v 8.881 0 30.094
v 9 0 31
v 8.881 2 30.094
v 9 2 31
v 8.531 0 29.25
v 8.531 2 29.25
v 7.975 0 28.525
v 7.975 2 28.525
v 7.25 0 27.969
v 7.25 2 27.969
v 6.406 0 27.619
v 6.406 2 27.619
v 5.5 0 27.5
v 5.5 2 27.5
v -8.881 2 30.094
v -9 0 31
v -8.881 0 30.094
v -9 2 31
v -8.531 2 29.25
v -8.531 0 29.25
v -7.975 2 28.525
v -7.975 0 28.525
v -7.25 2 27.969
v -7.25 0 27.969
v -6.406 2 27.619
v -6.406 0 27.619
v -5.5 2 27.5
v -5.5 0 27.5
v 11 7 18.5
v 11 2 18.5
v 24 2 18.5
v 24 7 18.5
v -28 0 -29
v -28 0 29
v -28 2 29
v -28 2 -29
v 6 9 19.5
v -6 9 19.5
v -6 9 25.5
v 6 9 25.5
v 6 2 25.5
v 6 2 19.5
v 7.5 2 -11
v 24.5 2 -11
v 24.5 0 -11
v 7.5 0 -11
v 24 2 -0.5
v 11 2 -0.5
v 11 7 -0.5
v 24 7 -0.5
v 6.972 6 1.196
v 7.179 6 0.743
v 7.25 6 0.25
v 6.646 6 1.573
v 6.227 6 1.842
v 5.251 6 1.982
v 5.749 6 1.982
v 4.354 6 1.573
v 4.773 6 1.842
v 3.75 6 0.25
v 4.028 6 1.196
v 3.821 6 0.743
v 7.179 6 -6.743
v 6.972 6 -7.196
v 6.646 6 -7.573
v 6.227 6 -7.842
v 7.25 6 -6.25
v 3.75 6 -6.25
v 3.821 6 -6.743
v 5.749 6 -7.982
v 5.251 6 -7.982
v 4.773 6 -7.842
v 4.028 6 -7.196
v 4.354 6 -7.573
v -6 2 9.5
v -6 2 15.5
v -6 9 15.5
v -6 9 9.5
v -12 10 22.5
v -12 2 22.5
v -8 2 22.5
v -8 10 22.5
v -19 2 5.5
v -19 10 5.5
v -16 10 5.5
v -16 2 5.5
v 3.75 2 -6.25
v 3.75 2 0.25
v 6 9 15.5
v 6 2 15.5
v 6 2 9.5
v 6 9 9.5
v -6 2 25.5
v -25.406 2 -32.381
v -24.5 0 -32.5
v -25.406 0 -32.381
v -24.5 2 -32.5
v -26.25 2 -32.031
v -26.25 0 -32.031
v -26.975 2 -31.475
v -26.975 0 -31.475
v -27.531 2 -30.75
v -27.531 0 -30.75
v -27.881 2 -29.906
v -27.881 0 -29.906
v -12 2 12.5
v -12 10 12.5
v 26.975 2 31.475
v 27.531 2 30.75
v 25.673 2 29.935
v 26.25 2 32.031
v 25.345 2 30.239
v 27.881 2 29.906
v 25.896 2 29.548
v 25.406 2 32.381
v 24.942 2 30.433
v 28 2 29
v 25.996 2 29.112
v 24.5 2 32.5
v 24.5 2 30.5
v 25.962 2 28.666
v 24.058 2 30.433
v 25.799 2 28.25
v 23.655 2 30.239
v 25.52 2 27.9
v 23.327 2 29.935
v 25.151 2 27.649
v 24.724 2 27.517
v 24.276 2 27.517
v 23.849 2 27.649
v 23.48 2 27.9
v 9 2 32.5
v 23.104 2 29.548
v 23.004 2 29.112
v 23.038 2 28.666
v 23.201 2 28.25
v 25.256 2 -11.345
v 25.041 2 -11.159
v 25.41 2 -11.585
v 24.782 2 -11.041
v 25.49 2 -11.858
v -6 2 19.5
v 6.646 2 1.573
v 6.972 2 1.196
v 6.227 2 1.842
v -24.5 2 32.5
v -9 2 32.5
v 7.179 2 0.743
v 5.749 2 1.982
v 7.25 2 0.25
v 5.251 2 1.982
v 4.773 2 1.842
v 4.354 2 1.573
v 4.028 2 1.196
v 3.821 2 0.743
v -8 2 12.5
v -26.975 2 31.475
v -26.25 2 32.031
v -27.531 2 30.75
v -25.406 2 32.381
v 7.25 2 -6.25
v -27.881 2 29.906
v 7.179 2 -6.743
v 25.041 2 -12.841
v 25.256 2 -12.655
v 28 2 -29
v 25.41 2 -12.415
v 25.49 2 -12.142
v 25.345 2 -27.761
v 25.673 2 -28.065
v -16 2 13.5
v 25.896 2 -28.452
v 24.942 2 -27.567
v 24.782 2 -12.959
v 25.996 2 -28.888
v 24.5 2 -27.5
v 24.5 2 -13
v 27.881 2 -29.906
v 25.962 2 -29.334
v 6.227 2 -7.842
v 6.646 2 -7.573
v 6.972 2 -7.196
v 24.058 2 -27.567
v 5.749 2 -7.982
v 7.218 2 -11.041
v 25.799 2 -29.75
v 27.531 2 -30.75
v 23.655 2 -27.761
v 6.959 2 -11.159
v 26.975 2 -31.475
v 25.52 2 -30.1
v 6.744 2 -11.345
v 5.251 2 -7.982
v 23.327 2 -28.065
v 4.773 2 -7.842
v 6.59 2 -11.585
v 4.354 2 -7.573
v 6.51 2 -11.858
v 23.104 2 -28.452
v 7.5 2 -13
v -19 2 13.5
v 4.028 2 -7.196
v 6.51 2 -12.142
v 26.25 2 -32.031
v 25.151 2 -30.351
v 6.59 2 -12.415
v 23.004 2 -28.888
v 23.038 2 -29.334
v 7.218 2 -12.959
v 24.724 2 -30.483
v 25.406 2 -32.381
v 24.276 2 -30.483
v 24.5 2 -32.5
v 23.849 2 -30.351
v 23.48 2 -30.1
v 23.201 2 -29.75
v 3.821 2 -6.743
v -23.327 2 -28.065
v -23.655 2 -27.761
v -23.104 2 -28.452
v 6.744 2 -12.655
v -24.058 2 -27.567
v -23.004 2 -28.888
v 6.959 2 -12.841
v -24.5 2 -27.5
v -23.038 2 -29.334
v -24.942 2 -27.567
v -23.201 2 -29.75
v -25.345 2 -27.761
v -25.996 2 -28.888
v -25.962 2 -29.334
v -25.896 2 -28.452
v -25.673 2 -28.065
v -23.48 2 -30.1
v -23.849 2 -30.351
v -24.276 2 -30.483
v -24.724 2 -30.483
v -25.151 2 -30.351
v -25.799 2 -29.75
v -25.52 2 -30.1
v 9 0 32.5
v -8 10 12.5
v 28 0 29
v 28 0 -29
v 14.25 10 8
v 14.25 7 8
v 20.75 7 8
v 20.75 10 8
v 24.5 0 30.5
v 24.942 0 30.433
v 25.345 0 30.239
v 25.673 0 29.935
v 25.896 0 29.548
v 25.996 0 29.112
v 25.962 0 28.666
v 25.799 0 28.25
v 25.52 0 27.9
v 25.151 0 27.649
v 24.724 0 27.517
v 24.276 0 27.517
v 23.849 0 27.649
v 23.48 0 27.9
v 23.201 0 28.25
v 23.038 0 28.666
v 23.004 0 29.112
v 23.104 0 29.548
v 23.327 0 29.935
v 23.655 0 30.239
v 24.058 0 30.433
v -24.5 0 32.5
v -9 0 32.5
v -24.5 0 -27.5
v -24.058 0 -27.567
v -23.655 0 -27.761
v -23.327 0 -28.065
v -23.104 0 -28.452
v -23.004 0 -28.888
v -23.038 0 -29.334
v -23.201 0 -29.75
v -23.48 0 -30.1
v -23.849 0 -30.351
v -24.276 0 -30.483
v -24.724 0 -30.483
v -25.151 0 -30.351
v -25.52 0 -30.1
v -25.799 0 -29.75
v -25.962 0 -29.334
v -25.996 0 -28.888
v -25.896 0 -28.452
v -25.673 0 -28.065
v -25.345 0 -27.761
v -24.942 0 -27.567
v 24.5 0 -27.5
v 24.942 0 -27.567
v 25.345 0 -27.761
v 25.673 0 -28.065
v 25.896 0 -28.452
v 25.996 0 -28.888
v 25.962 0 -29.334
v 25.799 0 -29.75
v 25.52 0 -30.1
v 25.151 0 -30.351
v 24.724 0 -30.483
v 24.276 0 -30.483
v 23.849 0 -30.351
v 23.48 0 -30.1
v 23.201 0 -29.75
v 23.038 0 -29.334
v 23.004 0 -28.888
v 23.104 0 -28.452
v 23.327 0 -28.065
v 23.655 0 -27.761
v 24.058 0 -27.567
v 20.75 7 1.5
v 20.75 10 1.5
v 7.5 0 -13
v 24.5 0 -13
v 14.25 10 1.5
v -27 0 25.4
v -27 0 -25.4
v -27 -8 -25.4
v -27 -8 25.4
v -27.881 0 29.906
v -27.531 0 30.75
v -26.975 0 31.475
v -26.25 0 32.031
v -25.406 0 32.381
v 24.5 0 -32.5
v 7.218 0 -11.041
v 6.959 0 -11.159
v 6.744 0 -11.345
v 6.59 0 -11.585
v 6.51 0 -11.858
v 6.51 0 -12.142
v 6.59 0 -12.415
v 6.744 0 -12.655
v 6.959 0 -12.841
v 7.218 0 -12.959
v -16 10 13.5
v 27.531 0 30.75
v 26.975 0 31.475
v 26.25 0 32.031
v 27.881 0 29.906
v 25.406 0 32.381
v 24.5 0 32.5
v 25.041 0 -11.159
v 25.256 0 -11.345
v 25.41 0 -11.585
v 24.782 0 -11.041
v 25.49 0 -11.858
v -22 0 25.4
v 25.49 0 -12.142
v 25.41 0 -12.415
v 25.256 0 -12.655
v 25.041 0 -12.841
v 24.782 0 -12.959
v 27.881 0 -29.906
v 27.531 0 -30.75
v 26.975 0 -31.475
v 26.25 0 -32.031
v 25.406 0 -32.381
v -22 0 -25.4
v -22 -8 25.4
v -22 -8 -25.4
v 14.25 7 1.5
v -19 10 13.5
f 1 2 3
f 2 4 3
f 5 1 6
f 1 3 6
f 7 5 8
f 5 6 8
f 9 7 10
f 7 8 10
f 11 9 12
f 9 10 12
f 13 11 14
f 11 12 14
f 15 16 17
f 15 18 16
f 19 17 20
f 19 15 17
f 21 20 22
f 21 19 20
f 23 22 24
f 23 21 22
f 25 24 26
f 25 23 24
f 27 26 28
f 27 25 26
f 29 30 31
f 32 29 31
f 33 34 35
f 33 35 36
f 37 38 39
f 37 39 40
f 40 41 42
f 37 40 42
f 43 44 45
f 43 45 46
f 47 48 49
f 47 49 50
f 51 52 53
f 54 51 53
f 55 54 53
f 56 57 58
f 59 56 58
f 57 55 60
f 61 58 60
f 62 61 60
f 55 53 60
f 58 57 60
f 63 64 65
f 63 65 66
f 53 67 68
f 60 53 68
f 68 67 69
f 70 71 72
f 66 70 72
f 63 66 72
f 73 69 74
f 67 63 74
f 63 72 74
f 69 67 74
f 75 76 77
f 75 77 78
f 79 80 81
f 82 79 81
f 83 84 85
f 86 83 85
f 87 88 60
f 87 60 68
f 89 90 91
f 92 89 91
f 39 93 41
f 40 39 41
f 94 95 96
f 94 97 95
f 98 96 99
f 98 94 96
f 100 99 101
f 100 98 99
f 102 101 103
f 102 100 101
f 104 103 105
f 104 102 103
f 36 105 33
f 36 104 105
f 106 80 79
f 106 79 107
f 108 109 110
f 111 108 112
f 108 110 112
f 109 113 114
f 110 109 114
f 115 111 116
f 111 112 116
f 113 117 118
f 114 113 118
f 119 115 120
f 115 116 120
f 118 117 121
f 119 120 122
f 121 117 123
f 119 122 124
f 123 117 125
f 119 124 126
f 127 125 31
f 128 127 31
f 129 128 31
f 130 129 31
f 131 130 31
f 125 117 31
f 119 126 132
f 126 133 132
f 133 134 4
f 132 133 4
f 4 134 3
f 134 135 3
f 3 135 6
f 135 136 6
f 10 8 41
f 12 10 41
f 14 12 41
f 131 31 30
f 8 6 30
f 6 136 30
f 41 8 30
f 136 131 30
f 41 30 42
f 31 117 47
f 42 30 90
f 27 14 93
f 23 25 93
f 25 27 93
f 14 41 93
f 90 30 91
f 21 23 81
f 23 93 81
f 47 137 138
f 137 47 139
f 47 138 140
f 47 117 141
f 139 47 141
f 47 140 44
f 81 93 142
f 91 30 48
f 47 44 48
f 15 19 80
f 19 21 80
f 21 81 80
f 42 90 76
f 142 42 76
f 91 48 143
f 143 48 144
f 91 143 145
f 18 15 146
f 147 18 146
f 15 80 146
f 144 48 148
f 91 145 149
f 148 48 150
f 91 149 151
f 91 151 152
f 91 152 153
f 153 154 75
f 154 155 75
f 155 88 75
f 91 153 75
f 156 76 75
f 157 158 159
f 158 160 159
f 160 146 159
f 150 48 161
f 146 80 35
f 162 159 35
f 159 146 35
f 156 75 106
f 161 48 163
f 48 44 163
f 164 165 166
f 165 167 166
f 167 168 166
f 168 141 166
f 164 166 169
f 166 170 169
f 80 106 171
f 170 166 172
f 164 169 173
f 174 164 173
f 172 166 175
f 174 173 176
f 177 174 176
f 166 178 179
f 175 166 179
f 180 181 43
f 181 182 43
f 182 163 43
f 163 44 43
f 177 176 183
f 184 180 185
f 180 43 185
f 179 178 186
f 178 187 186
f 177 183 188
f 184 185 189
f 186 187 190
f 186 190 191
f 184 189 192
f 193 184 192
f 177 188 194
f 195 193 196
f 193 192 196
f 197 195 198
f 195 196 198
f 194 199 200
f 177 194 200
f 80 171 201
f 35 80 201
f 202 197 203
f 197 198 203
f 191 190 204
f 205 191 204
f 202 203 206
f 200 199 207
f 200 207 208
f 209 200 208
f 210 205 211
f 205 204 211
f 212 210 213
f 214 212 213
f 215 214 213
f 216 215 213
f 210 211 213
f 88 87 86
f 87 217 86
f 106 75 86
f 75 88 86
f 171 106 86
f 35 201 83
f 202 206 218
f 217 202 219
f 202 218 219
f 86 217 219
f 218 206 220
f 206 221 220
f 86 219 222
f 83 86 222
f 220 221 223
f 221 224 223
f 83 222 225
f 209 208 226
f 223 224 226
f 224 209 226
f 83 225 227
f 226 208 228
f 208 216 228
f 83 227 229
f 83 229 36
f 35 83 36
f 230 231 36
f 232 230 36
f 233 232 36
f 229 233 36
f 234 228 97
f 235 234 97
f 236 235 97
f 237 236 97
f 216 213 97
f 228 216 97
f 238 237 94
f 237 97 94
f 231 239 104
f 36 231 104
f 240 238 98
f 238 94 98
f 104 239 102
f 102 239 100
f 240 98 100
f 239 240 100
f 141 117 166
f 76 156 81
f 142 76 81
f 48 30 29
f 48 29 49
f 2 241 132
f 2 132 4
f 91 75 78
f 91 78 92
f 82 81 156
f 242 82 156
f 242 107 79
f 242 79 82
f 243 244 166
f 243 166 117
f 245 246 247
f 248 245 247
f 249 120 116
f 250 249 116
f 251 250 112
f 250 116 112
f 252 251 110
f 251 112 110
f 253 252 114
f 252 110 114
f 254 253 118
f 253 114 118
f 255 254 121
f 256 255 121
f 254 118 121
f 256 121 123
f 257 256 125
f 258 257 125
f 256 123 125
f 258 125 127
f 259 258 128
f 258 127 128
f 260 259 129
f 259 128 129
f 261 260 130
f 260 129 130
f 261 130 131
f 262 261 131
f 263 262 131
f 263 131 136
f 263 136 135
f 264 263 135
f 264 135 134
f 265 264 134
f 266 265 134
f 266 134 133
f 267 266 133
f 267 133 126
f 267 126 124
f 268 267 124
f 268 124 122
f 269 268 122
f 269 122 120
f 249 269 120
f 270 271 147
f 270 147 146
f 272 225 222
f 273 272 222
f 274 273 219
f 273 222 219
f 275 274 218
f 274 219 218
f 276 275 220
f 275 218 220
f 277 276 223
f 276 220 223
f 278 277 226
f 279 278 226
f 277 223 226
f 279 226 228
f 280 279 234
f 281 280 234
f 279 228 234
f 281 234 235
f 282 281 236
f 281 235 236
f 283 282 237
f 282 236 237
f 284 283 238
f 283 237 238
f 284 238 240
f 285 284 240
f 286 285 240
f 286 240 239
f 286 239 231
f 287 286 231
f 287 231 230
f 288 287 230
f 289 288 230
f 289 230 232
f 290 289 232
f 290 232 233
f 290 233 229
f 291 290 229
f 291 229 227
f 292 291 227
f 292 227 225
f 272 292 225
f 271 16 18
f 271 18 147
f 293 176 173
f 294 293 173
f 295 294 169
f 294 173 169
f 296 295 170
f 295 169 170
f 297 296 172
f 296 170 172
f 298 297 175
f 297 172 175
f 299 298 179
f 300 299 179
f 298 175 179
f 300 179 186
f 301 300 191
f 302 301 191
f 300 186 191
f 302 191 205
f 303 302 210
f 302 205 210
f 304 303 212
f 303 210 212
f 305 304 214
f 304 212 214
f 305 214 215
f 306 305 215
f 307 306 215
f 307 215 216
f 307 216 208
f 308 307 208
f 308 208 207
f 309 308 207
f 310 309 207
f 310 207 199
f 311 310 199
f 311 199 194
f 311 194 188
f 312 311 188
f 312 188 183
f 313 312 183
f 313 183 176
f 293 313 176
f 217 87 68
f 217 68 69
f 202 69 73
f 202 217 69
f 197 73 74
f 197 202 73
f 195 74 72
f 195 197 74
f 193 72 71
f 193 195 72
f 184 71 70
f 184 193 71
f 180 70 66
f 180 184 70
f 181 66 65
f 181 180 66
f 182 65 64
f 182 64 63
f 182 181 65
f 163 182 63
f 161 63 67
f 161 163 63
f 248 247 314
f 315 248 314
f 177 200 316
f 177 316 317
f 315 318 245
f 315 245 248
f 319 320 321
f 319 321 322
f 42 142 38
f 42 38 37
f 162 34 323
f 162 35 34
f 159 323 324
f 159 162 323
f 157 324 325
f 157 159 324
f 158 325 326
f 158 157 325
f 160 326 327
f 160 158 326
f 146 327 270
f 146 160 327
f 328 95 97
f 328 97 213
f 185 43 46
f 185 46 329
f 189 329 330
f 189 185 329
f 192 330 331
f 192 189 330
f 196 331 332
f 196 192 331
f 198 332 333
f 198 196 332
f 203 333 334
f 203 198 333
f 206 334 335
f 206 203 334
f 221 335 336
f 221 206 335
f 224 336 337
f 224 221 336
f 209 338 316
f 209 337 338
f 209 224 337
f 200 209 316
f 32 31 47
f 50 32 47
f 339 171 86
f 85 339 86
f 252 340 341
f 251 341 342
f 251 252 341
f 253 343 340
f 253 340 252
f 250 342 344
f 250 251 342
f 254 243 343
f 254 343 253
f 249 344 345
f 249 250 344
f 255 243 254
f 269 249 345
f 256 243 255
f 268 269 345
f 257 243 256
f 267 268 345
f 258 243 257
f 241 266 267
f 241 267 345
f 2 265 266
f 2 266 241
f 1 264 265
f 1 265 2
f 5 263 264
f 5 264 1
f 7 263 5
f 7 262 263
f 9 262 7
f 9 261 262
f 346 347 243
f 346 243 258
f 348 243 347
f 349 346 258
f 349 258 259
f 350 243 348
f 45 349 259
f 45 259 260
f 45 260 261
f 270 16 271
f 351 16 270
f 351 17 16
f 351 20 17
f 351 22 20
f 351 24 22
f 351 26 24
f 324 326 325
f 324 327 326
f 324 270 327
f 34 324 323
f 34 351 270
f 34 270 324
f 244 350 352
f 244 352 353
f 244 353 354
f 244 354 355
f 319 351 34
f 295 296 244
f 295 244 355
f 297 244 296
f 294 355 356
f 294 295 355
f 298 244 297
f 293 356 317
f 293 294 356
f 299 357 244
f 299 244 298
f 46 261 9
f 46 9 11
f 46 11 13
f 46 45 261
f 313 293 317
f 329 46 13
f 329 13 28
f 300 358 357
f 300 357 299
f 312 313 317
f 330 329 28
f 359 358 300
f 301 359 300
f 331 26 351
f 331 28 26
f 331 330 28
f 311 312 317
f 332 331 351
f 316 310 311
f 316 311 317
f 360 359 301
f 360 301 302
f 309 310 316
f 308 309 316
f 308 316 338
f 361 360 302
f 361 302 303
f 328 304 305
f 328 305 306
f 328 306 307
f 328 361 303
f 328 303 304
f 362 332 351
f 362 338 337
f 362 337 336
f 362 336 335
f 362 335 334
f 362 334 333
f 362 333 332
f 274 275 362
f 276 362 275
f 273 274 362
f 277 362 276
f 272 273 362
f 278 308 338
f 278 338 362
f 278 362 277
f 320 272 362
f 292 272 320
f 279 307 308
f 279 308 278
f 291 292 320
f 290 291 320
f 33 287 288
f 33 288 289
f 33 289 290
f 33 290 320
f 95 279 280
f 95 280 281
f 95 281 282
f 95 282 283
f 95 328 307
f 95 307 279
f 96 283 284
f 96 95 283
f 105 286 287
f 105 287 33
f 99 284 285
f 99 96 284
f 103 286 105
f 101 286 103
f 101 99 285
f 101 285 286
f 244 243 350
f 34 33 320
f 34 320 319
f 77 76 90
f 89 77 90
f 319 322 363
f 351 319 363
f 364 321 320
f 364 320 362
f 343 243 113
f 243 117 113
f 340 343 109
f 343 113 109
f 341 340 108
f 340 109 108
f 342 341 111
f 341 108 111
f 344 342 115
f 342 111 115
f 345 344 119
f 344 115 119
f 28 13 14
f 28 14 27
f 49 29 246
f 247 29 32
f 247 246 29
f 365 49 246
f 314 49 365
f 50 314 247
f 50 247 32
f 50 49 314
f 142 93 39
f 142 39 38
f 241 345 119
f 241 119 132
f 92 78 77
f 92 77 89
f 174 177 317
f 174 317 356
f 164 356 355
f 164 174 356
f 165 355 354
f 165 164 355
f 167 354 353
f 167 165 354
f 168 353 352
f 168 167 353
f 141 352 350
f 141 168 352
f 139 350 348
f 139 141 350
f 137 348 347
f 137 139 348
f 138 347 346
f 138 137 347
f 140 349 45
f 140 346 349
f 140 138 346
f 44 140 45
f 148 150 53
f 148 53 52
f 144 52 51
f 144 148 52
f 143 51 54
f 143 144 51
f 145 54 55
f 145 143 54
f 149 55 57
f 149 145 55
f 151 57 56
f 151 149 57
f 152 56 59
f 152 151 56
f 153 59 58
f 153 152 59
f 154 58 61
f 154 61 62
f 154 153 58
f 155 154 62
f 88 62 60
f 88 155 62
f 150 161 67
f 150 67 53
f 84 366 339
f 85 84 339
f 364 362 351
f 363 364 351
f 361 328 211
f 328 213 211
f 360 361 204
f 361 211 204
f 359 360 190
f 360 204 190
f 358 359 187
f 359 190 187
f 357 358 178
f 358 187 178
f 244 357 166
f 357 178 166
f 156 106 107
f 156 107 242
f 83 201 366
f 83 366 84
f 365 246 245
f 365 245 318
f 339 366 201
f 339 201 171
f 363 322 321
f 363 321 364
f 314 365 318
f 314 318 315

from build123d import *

# Parameters (mm, degrees)
EXTRUDE_610_DEPTH      = 2
SKETCH_2_R             = 1.5
CUT_EXTRUDE_906_DEPTH  = 43.944731924
CUT_EXTRUDE_1170_DEPTH = 43.944731924
SKETCH_4_W             = 5
SKETCH_4_H             = 50.8
EXTRUDE_1451_DEPTH     = 8
SKETCH_5_W             = 12
SKETCH_5_H             = 6
CAN_DEPTH              = 7
PATTERN_LINEAR_1_COUNT = 2
PATTERN_LINEAR_1_PITCH = 10
SKETCH_6_W             = 4
SKETCH_6_H             = 10
EXTRUDE_2243_DEPTH     = 8
SKETCH_7_W             = 13
SKETCH_7_H             = 19
EXTRUDE_2697_DEPTH     = 5
SKETCH_8_W             = 6.5
SKETCH_8_H             = 6.5
EXTRUDE_2917_DEPTH     = 3
SKETCH_9_W             = 3
SKETCH_9_H             = 8
UART_DEPTH             = 8
EXTRUDE_3952_DEPTH     = 4
FILLET_1_R             = 3.5


with BuildPart() as part:
    # Эскиз1 → Extrude 610 (new body)
    with BuildSketch(Plane(origin=(0, 0, 0), x_dir=(1, 0, 0), z_dir=(0, 1, 0))):
        Polygon((-28, 32.5), (28, 32.5), (28, -32.5), (9, -32.5), (9, -27.5), (-9, -27.5), (-9, -32.5), (-28, -32.5), align=None)
    extrude(amount=EXTRUDE_610_DEPTH)

    # Эскиз2 → Cut-Extrude 906 (cut, through all)
    with BuildSketch(Plane(origin=(0, 2, 0), x_dir=(1, 0, 0), z_dir=(0, 1, 0))):
        with Locations(Location((-24.5, 29, 0), (0, 0, 270))):
            Circle(SKETCH_2_R)
        with Locations(Location((24.5, 29, 0), (0, 0, 270))):
            Circle(SKETCH_2_R)
        with Locations(Location((24.5, -29, 0), (0, 0, 270))):
            Circle(SKETCH_2_R)
    extrude(amount=-CUT_EXTRUDE_906_DEPTH, mode=Mode.SUBTRACT)

    # Эскиз3 → Cut-Extrude 1170 (cut, through all)
    with BuildSketch(Plane(origin=(0, 2, 0), x_dir=(1, 0, 0), z_dir=(0, 1, 0))):
        with BuildLine():
            Line((7.5, 13), (24.5, 13))
            ThreePointArc((24.5, 13), (25.5, 12), (24.5, 11))
            Line((24.5, 11), (7.5, 11))
            ThreePointArc((7.5, 11), (6.5, 12), (7.5, 13))
        make_face()
    extrude(amount=-CUT_EXTRUDE_1170_DEPTH, mode=Mode.SUBTRACT)

    # Эскиз4 → Extrude 1451 (add)
    with BuildSketch(Plane.XZ):
        with Locations((-24.5, 0)):
            Rectangle(SKETCH_4_W, SKETCH_4_H)
    extrude(amount=EXTRUDE_1451_DEPTH)

    # Эскиз5 → CAN разъем (add)
    with BuildSketch(Plane(origin=(0, 2, 0), x_dir=(1, 0, 0), z_dir=(0, 1, 0))):
        with Locations((0, -22.5)):
            Rectangle(SKETCH_5_W, SKETCH_5_H)
    can = extrude(amount=CAN_DEPTH)

    # Линейный массив1: CAN разъем ×2
    with Locations(*[(0, 0, -i * PATTERN_LINEAR_1_PITCH) for i in range(1, PATTERN_LINEAR_1_COUNT)]):
        add(can)

    # Эскиз6 → Extrude 2243 (add)
    with BuildSketch(Plane(origin=(0, 2, 0), x_dir=(1, 0, 0), z_dir=(0, 1, 0))):
        with Locations((-10, -17.5)):
            Rectangle(SKETCH_6_W, SKETCH_6_H)
    extrude(amount=EXTRUDE_2243_DEPTH)

    # Эскиз7 → Extrude 2697 (add)
    with BuildSketch(Plane(origin=(0, 2, 0), x_dir=(1, 0, 0), z_dir=(0, 1, 0))):
        with Locations((17.5, -9)):
            Rectangle(SKETCH_7_W, SKETCH_7_H)
    extrude(amount=EXTRUDE_2697_DEPTH)

    # Эскиз8 → Extrude 2917 (add)
    with BuildSketch(Plane(origin=(0, 7, 0), x_dir=(1, 0, 0), z_dir=(0, 1, 0))):
        with Locations((17.5, -4.75)):
            Rectangle(SKETCH_8_W, SKETCH_8_H)
    extrude(amount=EXTRUDE_2917_DEPTH)

    # Эскиз9 → uart (add)
    with BuildSketch(Plane(origin=(0, 2, 0), x_dir=(1, 0, 0), z_dir=(0, 1, 0))):
        with Locations((-17.5, -9.5)):
            Rectangle(SKETCH_9_W, SKETCH_9_H)
    extrude(amount=UART_DEPTH)

    # Эскиз10 → Extrude 3952 (add)
    with BuildSketch(Plane(origin=(0, 2, 0), x_dir=(1, 0, 0), z_dir=(0, 1, 0))):
        with BuildLine():
            Line((3.75, -0.25), (3.75, 6.25))
            ThreePointArc((3.75, 6.25), (5.5, 8), (7.25, 6.25))
            Line((7.25, 6.25), (7.25, -0.25))
            ThreePointArc((7.25, -0.25), (5.5, -2), (3.75, -0.25))
        make_face()
    extrude(amount=EXTRUDE_3952_DEPTH)

    # Скругление1
    fillet_1_edges = [part.edges().sort_by_distance(p)[0] for p in [
        (-28, 1, -32.5),
        (28, 1, -32.5),
        (28, 1, 32.5),
        (9, 1, 27.5),
        (-9, 1, 27.5),
        (-28, 1, 32.5),
    ]]
    fillet(fillet_1_edges, radius=FILLET_1_R)


solid = part.part
